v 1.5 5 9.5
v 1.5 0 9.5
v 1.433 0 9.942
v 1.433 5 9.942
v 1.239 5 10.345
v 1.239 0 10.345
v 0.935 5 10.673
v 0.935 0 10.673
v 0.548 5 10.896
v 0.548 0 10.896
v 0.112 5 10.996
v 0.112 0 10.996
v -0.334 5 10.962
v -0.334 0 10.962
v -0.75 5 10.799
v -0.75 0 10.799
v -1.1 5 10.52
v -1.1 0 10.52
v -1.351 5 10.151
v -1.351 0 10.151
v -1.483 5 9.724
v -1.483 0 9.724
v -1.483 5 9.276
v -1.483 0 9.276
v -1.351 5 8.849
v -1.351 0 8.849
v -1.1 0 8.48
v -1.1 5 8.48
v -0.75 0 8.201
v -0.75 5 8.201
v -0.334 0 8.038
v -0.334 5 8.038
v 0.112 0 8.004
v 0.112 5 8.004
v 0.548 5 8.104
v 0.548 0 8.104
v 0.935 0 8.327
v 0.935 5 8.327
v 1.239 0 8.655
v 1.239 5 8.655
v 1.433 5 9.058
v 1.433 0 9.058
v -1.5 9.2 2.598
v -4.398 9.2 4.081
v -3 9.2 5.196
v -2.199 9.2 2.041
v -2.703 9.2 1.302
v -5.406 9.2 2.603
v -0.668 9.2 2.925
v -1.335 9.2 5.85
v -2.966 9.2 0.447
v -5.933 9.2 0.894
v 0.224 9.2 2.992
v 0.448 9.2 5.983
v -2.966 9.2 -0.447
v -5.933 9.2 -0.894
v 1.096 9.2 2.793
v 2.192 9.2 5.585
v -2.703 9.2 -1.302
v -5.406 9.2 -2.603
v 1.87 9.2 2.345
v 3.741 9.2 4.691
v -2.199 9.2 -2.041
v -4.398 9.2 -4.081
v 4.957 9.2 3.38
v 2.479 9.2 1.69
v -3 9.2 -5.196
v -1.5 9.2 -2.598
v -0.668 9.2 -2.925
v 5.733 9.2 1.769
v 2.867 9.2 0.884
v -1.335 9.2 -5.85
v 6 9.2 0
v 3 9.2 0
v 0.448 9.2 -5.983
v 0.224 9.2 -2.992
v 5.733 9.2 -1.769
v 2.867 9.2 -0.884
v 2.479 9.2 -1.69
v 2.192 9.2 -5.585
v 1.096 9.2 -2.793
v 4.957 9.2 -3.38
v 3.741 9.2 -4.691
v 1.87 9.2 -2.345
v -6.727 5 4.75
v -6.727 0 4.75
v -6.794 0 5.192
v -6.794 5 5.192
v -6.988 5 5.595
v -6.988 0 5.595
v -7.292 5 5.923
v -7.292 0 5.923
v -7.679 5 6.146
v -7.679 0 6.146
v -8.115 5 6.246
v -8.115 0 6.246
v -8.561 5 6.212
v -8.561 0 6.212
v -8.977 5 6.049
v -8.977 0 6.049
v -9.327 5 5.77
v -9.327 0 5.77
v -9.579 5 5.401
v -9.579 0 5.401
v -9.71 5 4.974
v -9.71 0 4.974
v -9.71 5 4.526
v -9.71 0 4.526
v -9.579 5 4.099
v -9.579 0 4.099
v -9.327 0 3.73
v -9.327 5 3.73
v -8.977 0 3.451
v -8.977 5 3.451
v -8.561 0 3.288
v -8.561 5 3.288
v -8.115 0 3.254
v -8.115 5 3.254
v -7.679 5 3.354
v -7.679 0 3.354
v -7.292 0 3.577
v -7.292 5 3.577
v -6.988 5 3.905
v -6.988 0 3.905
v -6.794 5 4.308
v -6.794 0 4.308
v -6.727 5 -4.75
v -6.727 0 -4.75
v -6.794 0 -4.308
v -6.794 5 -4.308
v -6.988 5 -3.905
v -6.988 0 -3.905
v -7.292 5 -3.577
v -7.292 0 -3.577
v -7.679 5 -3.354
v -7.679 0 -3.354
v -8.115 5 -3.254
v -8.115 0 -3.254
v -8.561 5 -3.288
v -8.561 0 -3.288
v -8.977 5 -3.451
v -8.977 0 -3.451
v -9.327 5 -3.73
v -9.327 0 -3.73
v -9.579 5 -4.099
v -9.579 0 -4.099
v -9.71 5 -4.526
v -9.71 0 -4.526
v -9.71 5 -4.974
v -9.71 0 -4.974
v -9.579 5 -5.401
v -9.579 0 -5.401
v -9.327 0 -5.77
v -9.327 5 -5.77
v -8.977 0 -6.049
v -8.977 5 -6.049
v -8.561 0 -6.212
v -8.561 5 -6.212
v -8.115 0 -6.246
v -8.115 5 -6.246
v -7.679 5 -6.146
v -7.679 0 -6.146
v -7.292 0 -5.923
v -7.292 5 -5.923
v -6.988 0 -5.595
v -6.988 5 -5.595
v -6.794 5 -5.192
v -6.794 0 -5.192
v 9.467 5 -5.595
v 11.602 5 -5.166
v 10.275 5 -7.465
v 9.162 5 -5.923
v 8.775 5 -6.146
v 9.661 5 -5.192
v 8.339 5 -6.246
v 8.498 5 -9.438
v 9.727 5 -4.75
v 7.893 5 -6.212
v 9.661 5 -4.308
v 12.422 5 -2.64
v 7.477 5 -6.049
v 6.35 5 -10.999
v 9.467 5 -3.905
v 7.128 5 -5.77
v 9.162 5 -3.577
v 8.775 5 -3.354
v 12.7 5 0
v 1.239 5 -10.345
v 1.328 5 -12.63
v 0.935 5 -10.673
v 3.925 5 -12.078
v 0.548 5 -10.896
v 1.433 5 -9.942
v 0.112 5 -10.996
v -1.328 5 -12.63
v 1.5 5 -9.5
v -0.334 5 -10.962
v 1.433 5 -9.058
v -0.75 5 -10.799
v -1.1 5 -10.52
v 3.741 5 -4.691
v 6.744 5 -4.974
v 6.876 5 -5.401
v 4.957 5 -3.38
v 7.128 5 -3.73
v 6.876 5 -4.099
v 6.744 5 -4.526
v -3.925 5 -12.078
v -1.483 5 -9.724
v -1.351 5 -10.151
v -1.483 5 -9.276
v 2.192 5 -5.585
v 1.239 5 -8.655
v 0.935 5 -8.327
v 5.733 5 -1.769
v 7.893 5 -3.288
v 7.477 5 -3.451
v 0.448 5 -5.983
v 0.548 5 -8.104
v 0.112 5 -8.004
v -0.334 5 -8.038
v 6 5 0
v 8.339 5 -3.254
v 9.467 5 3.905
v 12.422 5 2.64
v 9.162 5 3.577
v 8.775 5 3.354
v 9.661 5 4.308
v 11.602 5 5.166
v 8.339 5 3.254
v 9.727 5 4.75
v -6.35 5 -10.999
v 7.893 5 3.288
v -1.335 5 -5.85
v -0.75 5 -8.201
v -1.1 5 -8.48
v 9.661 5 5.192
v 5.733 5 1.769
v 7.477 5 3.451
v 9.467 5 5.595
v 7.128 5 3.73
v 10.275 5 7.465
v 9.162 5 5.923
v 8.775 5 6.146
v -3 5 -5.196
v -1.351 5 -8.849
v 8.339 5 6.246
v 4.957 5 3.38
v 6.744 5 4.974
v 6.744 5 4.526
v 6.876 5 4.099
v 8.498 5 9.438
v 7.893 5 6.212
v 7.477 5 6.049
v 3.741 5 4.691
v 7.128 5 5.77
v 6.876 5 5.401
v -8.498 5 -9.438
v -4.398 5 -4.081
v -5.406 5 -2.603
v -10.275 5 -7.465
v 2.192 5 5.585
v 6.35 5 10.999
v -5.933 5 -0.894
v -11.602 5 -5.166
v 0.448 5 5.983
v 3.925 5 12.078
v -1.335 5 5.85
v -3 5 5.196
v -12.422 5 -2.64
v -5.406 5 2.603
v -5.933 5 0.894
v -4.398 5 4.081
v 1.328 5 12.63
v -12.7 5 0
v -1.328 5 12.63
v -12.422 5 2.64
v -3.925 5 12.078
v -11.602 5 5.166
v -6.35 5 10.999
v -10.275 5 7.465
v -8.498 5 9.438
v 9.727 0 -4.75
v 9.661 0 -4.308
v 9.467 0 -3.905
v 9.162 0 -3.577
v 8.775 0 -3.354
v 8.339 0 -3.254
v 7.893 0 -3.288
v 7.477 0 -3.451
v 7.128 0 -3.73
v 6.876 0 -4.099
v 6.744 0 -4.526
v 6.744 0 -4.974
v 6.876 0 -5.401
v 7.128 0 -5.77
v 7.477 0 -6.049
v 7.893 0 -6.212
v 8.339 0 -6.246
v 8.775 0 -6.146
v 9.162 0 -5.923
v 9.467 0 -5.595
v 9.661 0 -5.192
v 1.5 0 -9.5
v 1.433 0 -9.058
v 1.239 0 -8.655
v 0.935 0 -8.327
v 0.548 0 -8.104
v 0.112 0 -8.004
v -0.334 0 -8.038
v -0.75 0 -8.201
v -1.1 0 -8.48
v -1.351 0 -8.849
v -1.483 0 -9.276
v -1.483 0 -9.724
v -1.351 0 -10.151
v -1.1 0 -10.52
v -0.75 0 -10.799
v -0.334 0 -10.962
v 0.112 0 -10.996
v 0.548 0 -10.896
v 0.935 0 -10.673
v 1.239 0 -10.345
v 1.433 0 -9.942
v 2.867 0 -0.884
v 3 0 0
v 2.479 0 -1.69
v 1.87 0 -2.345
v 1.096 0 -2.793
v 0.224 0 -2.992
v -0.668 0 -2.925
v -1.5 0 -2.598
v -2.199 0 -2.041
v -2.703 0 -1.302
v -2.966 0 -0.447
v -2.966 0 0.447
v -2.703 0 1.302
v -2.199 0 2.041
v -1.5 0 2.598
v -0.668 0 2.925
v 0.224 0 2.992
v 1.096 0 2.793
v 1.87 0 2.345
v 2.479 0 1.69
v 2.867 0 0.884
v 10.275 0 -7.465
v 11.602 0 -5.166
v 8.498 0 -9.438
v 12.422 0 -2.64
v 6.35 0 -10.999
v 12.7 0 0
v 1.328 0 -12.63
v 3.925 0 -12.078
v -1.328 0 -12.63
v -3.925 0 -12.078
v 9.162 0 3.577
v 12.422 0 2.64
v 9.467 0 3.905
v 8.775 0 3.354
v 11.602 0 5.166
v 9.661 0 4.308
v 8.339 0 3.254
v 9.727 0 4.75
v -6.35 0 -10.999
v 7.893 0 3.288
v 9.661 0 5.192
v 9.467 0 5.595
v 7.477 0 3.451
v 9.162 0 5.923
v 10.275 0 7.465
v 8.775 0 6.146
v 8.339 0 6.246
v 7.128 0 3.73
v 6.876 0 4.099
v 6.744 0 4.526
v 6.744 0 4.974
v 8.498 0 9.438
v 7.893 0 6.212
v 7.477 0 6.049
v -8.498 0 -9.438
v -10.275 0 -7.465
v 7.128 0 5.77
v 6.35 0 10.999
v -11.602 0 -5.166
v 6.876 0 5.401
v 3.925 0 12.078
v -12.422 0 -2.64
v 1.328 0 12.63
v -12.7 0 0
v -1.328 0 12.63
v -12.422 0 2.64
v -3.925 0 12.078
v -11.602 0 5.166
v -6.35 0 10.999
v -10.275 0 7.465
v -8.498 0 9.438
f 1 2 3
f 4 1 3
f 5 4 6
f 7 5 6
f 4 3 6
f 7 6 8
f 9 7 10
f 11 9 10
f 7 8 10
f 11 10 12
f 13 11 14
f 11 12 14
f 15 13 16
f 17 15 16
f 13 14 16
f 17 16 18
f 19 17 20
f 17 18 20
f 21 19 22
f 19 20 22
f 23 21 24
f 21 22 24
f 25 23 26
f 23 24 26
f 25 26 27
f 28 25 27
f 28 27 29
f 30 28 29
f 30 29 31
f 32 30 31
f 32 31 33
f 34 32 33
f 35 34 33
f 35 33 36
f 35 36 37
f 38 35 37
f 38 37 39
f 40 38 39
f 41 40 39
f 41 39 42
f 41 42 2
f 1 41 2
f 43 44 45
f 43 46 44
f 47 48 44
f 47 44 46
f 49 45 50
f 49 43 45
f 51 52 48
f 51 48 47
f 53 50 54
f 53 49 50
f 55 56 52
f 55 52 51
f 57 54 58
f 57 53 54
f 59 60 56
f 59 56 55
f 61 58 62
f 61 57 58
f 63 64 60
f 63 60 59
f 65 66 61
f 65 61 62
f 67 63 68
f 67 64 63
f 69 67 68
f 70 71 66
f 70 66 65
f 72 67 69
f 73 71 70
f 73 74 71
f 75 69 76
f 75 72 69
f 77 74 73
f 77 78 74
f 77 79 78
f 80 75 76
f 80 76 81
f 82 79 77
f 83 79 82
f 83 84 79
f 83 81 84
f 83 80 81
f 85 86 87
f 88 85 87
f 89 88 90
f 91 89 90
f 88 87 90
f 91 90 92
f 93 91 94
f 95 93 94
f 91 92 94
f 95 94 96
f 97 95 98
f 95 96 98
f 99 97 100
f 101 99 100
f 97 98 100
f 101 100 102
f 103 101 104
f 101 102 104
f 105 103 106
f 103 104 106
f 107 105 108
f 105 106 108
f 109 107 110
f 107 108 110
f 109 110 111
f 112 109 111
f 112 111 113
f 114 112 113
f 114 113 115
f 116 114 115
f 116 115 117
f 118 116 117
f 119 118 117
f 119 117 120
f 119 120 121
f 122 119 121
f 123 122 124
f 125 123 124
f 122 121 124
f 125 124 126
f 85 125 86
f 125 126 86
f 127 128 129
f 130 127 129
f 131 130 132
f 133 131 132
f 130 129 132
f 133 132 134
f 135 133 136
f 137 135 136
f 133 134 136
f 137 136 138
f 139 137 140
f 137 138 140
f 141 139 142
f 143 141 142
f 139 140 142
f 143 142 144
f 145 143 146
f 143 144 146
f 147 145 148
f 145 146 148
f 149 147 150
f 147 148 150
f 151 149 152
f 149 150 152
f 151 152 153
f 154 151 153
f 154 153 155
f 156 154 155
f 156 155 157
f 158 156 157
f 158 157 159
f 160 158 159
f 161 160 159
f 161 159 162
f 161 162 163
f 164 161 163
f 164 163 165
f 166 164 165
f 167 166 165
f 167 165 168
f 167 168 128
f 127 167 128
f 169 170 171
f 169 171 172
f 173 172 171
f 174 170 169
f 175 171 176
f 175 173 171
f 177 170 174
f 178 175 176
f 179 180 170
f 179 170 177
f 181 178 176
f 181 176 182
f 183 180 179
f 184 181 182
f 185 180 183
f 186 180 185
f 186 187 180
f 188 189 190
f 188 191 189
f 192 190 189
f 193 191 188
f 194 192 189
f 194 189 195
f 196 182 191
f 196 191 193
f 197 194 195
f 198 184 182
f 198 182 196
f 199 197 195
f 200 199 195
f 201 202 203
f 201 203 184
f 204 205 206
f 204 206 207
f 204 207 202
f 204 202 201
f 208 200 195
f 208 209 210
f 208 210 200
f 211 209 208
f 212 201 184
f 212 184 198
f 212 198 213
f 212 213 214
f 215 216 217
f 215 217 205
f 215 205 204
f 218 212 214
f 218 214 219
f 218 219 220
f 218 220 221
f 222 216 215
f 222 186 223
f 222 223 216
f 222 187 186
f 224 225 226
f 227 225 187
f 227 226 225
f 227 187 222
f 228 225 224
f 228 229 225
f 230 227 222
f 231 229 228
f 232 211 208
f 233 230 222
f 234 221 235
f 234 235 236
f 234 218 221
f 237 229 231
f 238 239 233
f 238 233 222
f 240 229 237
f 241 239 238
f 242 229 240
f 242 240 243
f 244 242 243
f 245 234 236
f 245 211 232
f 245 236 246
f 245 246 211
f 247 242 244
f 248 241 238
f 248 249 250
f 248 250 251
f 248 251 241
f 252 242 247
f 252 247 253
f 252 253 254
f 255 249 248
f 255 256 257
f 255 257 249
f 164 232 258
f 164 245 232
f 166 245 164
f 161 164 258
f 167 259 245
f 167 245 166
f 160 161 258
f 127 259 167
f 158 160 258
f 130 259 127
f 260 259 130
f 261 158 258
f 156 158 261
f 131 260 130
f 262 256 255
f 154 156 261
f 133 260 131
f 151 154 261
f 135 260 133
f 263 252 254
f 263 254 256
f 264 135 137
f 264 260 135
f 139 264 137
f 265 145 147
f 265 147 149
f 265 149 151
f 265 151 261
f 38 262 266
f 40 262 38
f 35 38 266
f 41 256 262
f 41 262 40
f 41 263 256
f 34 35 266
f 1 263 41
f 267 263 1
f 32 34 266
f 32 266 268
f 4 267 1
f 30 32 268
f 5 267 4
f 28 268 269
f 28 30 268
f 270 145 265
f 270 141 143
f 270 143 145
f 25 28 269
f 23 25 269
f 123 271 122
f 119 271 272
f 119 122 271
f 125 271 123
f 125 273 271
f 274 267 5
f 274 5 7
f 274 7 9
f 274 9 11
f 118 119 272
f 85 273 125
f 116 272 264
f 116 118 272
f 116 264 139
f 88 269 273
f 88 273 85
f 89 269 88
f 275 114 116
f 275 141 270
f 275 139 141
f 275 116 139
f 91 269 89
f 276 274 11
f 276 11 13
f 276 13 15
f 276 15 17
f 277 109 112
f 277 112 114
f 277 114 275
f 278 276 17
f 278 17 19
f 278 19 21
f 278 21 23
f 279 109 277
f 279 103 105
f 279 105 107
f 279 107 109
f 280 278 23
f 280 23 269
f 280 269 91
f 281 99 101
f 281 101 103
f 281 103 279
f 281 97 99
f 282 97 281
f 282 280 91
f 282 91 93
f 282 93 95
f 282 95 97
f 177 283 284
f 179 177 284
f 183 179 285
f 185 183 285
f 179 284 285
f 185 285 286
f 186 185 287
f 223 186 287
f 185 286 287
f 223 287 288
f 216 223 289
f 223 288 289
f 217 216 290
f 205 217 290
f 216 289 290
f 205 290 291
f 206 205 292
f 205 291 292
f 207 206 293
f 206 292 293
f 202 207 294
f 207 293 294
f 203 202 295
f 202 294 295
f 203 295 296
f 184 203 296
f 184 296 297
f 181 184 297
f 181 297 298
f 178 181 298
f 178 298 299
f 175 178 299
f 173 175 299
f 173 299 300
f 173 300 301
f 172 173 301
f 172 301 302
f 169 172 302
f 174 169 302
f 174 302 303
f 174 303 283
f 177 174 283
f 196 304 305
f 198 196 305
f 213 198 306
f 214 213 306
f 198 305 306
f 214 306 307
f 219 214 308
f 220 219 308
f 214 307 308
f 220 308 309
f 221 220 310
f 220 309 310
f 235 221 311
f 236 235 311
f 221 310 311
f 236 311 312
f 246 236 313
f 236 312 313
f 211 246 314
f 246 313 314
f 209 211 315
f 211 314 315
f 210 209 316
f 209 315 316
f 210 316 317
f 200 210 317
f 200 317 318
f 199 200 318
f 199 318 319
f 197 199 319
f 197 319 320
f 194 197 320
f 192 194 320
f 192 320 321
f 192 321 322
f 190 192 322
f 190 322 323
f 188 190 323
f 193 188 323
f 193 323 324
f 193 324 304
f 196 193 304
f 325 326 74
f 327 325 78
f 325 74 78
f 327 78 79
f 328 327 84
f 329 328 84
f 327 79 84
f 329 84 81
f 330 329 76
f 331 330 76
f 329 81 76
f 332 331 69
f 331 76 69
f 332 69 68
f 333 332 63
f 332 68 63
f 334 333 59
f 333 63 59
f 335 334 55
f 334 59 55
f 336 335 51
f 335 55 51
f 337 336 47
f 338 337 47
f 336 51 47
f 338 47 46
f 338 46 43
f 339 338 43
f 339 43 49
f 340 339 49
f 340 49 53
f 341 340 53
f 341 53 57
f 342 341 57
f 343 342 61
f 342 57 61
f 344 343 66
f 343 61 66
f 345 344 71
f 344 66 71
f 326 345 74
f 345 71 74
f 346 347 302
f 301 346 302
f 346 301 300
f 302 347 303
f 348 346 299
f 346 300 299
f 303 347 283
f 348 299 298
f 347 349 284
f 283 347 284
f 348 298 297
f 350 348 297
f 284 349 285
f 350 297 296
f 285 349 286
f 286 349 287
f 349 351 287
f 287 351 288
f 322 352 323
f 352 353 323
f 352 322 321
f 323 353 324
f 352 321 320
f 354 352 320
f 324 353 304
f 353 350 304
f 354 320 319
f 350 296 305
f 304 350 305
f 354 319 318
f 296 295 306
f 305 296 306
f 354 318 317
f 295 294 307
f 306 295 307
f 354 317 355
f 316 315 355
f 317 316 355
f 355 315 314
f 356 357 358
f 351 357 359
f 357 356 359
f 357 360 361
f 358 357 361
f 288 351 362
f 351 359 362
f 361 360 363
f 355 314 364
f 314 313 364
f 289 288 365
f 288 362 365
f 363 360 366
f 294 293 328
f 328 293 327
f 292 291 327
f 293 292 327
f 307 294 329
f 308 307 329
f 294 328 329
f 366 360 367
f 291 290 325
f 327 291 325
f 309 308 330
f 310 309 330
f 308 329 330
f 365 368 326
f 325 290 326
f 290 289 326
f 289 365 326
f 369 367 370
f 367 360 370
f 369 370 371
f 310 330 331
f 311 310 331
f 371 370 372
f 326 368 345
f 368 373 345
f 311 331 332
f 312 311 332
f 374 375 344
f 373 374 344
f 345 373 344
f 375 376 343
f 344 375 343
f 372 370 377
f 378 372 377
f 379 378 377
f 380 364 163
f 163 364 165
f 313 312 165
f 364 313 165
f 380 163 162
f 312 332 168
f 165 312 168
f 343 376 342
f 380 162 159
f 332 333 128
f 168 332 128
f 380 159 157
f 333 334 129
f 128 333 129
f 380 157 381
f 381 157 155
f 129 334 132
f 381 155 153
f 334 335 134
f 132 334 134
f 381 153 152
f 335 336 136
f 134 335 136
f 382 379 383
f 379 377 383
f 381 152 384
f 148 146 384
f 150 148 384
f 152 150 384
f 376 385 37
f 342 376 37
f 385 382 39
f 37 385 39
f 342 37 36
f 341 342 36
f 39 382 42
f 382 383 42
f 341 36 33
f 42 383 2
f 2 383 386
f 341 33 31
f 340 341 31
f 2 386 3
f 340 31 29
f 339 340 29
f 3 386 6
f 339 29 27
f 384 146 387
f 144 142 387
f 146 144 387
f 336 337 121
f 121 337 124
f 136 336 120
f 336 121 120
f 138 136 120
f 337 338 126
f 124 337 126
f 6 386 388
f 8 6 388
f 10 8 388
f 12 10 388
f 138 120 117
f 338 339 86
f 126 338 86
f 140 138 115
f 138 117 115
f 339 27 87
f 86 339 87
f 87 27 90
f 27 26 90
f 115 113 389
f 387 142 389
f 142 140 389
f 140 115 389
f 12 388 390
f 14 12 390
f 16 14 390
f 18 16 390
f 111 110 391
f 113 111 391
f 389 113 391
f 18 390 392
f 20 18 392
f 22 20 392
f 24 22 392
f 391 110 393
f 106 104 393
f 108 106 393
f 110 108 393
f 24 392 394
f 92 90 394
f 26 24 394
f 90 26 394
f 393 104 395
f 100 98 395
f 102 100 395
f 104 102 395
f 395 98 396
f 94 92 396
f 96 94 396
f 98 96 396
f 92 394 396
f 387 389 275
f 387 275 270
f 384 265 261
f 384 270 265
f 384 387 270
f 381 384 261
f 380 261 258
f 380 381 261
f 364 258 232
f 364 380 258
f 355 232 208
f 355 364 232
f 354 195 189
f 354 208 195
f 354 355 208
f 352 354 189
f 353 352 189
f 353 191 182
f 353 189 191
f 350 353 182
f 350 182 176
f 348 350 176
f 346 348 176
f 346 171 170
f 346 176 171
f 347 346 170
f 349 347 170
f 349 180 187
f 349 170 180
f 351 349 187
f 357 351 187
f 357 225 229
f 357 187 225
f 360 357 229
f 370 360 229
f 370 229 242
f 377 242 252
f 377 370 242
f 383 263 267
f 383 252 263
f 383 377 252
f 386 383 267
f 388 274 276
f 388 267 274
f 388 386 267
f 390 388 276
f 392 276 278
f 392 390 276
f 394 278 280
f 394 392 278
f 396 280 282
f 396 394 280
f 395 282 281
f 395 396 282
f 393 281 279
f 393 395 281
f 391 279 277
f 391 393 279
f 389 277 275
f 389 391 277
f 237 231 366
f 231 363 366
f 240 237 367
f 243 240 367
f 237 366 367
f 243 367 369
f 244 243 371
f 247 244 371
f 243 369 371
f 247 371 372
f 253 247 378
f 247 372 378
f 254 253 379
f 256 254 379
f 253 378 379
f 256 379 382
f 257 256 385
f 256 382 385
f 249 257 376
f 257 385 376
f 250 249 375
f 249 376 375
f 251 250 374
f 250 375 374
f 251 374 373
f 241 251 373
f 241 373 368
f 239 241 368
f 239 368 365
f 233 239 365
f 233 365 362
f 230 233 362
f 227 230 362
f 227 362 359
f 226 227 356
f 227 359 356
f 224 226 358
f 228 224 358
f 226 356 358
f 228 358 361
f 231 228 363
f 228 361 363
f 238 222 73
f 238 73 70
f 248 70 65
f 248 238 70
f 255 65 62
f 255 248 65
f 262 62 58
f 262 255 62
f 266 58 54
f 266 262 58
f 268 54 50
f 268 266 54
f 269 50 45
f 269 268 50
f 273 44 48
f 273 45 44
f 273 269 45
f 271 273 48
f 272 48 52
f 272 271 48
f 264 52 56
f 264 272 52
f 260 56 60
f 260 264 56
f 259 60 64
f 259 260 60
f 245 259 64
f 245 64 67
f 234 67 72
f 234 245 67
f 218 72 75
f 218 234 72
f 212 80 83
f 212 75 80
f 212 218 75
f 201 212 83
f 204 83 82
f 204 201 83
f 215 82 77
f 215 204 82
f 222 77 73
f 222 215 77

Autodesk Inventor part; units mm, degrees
ref_plane "YZ Plane" through (0, 0, 0) normal (1, 0, 0) x (0, 1, 0)
ref_plane "XZ Plane" through (0, 0, 0) normal (0, 1, 0) x (-1, 0, 0)
ref_plane "XY Plane" through (0, 0, 0) normal (0, 0, 1) x (1, 0, 0)
sketch "Esquisse1" plane through (0, 0, 0) normal (0, 1, 0) x (-1, 0, 0)
  circle A0 centre (0, 0) radius 12.7
  dimension "d0" = 25.4
extrude "Extrusion1" add sketch "Esquisse1" along normal blind 5
sketch "Esquisse2" plane through (0, 5, 0) normal (0, 1, 0) x (1, 0, 0)
  circle A0 centre (0, 0) radius 12.7 projected
  circle A1 centre (0, 0) radius 6
  dimension "d3" = 12
extrude "Extrusion2" add sketch "Esquisse2" along normal blind 4.2 contours A1
sketch "Esquisse3" plane through (0, 9.2, 0) normal (0, 1, 0) x (1, 0, 0)
  circle A0 centre (0, 0) radius 6 projected
  circle A1 centre (0, 0) radius 3
  dimension "d6" = 6
extrude "Extrusion3" cut sketch "Esquisse3" against normal through all contours A1
sketch "Esquisse4" plane through (0, 0, 0) normal (0, -1, 0) x (1, 0, 0)
  circle A0 centre (0, 0) radius 3 projected
  circle A1 centre (0, 9.5) radius 1.5
  circle A2 centre (-8.2272, 4.75) radius 1.5
  circle A3 centre (-8.2272, -4.75) radius 1.5
  circle A4 centre (0, -9.5) radius 1.5
  circle A5 centre (8.2272, -4.75) radius 1.5
  circle A6 centre (8.2272, 4.75) radius 1.5
  dimension "d9" = 3
  dimension "d10" = 9.5
  dimension "d11" = 0
  dimension "d14" = 360
extrude "Extrusion4" cut sketch "Esquisse4" against normal through all contours A1 | A2 | A3 | A4 | A5 | A6
properties part number "hub_6mm_M3"
